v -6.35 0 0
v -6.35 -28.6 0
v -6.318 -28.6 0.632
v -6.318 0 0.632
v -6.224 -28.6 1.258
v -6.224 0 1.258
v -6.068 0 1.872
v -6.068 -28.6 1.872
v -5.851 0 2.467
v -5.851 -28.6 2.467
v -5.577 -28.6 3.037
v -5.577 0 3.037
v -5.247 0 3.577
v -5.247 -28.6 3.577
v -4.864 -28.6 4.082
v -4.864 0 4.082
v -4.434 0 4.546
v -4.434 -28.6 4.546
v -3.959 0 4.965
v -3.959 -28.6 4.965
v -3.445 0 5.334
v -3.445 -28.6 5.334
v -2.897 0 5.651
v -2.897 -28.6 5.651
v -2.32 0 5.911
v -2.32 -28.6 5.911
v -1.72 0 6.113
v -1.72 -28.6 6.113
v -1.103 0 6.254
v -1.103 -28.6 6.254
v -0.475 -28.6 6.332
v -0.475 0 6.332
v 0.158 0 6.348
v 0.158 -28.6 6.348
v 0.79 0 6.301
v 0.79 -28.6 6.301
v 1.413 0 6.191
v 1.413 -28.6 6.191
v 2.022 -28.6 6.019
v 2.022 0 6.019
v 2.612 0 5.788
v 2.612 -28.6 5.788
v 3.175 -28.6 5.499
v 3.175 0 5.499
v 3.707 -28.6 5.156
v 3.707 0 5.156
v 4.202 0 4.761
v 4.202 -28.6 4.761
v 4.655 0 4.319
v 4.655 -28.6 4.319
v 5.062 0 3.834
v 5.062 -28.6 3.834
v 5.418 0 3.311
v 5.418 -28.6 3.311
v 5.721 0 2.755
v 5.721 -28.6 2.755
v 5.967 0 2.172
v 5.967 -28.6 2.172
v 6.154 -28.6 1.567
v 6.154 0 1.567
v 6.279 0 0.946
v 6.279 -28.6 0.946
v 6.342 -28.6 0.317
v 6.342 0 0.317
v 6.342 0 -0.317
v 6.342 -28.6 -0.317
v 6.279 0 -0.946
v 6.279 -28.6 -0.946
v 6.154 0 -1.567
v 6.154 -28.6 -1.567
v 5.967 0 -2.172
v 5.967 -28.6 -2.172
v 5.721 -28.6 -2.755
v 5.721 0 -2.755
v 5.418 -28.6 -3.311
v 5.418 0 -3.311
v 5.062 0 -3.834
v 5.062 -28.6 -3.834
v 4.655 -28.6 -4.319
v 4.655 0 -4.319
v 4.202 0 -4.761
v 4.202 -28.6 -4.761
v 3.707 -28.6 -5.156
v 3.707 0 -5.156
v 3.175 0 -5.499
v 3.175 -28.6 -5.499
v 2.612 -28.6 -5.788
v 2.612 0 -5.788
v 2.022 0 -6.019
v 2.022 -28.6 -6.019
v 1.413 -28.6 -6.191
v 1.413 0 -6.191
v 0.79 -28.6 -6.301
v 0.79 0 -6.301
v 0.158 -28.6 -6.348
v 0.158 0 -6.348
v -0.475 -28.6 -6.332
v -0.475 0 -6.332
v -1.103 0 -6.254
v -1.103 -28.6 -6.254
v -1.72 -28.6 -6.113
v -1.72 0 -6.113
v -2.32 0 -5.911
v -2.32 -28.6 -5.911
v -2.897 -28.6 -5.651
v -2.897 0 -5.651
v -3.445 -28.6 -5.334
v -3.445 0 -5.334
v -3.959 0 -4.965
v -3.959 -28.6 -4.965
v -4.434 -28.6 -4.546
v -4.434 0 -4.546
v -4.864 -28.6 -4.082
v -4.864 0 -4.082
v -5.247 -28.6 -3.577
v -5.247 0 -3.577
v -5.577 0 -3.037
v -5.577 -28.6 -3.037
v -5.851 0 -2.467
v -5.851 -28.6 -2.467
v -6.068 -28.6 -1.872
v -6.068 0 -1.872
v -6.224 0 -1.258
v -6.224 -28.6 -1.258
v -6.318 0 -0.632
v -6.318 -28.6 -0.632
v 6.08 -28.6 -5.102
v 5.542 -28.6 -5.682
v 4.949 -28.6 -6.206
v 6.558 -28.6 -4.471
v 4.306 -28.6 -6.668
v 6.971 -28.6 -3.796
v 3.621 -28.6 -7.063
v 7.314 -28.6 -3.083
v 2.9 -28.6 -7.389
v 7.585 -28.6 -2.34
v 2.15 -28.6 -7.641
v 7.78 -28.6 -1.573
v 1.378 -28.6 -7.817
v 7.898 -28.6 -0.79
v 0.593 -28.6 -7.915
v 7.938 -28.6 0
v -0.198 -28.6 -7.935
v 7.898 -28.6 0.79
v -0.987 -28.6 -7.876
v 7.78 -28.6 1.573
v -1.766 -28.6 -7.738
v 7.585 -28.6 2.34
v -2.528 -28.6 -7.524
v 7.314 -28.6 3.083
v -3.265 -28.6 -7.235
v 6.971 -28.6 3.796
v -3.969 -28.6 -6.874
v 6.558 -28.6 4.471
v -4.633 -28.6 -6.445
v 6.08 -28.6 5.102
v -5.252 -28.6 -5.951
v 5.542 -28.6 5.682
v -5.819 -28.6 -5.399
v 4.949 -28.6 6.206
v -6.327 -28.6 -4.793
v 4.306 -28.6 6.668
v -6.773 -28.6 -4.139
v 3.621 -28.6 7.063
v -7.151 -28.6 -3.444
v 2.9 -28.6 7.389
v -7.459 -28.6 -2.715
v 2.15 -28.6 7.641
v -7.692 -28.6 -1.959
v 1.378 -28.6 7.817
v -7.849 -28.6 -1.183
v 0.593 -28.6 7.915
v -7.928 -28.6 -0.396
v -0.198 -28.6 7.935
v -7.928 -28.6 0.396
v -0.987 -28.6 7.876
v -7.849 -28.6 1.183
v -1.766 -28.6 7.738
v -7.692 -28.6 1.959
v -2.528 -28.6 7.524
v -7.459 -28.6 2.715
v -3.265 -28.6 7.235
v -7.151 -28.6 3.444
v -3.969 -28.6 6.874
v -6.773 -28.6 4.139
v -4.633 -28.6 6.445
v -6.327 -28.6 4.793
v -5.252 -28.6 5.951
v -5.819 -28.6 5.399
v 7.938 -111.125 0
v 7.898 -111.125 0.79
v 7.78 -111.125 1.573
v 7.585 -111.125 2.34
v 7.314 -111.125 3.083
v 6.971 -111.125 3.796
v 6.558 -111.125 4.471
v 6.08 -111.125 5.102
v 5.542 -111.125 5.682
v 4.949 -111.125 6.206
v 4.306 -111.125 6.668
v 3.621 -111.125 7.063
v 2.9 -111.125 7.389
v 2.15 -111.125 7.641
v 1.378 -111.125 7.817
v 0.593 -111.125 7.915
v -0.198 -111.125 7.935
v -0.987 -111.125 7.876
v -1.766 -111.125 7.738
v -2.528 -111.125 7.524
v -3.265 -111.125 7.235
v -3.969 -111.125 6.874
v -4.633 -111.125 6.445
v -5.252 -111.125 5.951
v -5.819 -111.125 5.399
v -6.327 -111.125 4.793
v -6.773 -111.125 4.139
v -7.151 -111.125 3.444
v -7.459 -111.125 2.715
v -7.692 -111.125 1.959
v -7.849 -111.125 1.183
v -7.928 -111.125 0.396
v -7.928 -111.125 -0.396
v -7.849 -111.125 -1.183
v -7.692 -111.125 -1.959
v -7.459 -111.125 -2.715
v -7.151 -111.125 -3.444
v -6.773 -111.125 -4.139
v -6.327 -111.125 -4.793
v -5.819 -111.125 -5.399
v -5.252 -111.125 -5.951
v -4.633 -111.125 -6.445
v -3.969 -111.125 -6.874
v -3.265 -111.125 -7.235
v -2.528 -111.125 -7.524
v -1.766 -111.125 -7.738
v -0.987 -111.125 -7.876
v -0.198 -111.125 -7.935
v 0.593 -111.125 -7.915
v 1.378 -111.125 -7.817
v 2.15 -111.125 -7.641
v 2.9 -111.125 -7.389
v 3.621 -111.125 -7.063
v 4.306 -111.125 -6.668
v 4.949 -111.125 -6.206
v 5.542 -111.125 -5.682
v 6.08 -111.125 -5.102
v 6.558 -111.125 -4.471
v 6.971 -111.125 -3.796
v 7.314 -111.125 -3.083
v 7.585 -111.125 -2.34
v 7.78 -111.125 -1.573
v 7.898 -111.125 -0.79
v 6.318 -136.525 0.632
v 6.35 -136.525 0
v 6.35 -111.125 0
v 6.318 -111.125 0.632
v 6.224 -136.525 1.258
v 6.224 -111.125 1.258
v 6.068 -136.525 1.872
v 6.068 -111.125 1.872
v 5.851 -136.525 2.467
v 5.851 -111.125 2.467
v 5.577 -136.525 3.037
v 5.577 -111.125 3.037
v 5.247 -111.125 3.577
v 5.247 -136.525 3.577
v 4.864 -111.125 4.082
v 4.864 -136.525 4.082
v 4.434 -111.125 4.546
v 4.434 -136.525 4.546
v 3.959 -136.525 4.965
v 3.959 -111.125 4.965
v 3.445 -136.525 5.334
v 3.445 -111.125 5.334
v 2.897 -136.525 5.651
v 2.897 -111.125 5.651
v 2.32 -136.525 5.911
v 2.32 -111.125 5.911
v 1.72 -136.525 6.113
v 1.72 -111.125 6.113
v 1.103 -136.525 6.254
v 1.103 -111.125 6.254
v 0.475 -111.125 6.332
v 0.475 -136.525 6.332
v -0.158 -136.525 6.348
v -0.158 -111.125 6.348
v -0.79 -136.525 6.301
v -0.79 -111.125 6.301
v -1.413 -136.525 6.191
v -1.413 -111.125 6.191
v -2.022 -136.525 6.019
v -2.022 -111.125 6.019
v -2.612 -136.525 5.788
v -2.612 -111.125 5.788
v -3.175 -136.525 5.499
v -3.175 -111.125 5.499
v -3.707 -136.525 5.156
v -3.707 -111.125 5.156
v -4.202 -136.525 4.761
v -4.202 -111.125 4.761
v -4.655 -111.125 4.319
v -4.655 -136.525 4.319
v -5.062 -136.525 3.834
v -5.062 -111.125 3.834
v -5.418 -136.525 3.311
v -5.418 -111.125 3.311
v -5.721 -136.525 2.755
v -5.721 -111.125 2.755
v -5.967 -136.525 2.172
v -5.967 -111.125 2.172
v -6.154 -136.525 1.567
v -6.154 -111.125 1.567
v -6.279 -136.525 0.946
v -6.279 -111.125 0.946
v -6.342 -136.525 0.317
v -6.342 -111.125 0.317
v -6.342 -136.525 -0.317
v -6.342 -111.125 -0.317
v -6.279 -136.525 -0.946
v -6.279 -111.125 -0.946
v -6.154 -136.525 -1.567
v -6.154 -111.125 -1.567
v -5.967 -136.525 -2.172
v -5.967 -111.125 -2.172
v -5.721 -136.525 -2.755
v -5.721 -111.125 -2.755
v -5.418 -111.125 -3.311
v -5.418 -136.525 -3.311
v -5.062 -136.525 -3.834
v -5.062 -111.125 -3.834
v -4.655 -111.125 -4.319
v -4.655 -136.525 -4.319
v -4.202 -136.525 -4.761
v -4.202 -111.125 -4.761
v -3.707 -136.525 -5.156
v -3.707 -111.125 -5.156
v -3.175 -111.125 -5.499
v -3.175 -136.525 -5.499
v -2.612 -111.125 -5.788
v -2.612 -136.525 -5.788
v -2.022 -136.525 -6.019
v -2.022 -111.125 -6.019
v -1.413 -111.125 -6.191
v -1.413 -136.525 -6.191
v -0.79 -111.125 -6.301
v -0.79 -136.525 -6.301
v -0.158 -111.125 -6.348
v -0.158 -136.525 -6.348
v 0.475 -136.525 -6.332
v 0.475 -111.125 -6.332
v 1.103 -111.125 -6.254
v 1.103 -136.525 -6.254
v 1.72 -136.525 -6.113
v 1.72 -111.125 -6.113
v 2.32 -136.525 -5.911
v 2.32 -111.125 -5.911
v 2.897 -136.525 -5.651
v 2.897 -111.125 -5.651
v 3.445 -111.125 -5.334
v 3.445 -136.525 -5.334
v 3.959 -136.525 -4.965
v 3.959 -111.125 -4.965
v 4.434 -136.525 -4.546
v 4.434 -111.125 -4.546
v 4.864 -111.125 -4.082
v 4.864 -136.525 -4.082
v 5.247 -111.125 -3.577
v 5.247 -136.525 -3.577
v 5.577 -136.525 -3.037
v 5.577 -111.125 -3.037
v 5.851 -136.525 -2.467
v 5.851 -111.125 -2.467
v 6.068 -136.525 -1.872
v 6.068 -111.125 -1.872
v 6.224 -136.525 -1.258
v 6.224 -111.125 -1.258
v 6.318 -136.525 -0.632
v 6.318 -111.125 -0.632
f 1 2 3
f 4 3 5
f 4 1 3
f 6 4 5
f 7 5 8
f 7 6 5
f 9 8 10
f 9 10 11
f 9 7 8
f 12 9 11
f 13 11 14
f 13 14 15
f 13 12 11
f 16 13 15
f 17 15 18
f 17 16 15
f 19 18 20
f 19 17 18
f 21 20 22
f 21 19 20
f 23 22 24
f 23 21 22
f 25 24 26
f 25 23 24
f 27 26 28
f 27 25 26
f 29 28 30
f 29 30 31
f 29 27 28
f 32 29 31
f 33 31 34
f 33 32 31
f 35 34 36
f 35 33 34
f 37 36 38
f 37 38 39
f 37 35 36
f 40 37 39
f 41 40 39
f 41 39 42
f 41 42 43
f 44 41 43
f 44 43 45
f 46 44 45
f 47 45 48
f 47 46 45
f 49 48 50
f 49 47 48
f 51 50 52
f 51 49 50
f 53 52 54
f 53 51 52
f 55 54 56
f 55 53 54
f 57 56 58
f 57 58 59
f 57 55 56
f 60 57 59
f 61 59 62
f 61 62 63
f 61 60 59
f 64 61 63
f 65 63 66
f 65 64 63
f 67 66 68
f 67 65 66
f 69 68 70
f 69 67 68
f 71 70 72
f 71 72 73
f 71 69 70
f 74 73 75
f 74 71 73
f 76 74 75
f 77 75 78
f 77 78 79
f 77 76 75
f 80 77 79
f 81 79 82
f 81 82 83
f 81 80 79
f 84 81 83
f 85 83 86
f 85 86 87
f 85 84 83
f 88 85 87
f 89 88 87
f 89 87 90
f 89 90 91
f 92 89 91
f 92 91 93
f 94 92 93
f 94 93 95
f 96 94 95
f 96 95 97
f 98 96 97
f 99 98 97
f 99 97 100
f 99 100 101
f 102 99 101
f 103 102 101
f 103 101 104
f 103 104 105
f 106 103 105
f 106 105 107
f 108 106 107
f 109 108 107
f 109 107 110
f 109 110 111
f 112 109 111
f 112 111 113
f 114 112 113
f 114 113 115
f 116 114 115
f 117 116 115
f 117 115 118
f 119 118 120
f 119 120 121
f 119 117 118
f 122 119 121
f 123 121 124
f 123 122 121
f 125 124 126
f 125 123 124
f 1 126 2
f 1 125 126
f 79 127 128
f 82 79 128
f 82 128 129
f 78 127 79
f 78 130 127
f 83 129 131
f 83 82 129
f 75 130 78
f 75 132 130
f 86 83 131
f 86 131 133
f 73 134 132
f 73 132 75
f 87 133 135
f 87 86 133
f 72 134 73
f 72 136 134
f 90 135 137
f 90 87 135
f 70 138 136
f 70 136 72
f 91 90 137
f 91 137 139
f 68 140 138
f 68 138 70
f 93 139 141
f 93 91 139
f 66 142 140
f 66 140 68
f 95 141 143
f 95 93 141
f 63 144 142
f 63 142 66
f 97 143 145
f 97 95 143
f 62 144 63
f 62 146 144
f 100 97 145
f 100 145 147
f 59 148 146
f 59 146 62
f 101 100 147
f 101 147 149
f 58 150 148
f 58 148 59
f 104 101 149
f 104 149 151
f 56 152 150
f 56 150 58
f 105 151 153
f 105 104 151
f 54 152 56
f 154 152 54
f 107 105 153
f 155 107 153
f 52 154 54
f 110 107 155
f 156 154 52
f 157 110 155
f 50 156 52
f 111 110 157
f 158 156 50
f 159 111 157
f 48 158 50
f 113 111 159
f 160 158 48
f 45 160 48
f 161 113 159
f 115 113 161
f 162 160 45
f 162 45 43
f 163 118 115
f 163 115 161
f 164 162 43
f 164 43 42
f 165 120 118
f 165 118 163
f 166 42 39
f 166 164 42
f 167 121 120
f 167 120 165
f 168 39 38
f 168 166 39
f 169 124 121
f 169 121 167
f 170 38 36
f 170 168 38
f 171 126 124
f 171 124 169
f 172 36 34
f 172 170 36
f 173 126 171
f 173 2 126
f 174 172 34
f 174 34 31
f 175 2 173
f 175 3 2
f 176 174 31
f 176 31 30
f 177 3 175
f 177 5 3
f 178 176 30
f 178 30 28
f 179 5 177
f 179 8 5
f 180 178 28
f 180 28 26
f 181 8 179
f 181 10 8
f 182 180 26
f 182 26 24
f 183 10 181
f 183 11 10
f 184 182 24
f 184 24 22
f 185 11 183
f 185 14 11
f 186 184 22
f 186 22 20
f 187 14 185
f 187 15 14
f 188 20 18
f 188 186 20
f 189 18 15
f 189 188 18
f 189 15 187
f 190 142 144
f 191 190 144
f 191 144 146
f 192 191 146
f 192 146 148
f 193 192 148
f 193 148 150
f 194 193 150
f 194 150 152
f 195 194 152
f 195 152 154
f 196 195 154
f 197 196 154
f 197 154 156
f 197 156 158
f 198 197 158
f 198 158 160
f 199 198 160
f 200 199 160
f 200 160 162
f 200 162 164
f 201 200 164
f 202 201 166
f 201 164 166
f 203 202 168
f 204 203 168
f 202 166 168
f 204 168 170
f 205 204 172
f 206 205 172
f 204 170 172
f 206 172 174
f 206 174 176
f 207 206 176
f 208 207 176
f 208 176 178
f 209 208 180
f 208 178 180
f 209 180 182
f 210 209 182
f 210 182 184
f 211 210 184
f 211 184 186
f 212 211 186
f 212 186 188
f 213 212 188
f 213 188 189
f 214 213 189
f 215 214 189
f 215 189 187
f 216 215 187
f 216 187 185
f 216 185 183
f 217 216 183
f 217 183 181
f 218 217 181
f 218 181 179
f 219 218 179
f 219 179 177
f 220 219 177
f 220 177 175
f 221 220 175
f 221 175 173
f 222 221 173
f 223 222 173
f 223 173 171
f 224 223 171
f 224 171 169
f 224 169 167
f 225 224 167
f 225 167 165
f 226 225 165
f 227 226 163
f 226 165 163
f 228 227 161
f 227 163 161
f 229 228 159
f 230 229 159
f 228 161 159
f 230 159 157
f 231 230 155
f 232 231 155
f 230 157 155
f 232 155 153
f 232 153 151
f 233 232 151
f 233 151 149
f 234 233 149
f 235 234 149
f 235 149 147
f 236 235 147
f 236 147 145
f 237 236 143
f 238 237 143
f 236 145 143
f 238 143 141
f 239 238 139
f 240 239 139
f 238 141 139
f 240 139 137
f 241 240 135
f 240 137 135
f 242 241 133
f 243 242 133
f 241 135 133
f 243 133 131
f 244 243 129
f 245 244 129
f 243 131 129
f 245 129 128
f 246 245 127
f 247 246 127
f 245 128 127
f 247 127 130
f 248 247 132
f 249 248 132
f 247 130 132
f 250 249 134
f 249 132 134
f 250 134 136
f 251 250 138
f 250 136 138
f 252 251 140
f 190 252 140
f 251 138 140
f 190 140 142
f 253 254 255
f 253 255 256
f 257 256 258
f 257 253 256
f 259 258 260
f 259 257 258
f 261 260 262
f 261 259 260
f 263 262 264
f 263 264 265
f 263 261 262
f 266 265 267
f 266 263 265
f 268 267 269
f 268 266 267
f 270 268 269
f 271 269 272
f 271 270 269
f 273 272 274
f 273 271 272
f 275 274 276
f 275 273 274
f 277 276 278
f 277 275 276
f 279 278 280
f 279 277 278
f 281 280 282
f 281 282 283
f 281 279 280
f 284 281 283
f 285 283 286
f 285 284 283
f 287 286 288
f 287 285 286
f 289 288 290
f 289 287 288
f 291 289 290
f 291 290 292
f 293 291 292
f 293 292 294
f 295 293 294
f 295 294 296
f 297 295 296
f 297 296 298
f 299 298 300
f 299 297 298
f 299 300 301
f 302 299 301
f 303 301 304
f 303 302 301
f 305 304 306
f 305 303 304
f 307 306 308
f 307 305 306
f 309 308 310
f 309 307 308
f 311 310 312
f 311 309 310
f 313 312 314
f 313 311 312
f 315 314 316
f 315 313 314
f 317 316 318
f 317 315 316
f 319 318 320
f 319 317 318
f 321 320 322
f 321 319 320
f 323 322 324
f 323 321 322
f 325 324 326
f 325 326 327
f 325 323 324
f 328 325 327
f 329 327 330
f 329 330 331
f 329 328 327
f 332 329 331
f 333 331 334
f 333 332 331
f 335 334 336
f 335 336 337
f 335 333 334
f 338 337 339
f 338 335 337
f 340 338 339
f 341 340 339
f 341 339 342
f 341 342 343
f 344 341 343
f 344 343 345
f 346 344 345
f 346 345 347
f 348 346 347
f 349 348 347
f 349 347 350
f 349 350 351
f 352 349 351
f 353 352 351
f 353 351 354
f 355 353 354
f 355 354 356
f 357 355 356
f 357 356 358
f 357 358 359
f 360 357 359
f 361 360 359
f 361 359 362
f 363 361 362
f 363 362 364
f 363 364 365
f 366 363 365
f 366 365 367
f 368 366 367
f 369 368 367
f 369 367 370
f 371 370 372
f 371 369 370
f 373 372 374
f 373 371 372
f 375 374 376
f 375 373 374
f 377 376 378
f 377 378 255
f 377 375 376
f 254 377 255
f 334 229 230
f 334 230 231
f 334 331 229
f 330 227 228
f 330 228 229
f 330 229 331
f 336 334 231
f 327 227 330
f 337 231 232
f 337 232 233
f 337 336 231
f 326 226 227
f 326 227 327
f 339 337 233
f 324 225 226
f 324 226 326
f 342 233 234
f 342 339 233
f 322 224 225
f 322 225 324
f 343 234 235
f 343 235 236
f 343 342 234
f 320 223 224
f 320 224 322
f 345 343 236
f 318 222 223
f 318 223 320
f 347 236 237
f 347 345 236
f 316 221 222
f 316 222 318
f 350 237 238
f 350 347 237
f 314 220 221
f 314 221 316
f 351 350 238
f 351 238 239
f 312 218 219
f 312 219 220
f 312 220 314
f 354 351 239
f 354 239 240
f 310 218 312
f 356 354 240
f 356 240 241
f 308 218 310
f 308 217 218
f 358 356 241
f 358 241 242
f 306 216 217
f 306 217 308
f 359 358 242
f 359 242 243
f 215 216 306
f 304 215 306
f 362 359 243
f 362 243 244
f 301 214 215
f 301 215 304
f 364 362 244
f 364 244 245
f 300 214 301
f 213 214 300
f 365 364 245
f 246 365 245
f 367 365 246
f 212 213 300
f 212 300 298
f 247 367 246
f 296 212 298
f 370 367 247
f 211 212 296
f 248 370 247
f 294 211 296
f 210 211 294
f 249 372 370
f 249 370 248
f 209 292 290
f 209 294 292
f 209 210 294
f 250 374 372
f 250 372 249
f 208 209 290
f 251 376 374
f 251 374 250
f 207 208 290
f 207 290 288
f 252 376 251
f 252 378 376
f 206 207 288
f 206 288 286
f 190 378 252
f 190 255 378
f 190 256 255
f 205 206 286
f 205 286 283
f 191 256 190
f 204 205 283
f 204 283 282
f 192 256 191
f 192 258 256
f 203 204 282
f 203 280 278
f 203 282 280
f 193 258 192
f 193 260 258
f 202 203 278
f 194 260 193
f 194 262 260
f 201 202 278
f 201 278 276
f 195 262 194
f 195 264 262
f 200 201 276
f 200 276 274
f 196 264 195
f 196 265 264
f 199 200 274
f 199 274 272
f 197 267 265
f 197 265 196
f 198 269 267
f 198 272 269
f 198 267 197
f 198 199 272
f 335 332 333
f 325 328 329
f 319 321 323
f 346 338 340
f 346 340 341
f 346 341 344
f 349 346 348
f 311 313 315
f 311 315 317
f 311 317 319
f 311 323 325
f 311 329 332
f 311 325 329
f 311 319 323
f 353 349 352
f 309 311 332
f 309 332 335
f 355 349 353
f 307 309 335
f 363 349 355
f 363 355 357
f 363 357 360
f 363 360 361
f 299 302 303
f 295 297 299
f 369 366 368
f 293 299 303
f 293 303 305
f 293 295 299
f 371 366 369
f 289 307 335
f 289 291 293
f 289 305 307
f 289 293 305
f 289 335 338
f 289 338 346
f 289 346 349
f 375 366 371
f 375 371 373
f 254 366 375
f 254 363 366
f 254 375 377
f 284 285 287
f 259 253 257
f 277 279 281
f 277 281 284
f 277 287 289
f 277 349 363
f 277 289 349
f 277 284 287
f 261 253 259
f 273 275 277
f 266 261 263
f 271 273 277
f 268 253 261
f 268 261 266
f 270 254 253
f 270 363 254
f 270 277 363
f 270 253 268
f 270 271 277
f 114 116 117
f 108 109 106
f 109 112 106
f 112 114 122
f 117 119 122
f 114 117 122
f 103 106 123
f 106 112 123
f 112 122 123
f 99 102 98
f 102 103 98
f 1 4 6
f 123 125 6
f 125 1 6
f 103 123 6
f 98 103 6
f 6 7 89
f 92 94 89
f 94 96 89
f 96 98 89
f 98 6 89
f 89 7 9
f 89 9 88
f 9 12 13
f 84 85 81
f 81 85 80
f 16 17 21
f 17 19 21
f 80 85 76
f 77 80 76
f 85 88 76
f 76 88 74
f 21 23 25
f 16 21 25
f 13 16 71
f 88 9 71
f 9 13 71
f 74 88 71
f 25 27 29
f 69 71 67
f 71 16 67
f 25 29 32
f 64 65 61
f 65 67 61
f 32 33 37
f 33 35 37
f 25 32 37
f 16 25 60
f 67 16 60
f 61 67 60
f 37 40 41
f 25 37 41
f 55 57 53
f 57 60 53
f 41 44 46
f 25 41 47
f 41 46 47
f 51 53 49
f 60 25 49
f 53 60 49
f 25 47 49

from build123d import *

# Parameters (mm, degrees)
F0_R     = 7.9375
F1_DEPTH = 136.525
F2_R     = 7.9375
F2_R_2   = 6.35
F3_DEPTH = 25.4
F4_R     = 7.9375
F4_R_2   = 6.35
F5_DEPTH = 28.6004


with BuildPart() as f1:
    # F0 (on Front) → F1 (new body)
    with BuildSketch(Plane.XZ):
        Circle(F0_R)
    extrude(amount=F1_DEPTH)

    # F2 (on face) → F3 (cut)
    with BuildSketch(Plane.XZ.offset(136.525)):
        Circle(F2_R)
        Circle(F2_R_2, mode=Mode.SUBTRACT)
    extrude(amount=-F3_DEPTH, mode=Mode.SUBTRACT)

    # F4 (on face) → F5 (cut)
    with BuildSketch(Plane(origin=(0, 0, 0), x_dir=(-1, 0, 0), z_dir=(0, 1, 0))):
        Circle(F4_R)
        Circle(F4_R_2, mode=Mode.SUBTRACT)
    extrude(amount=-F5_DEPTH, mode=Mode.SUBTRACT)


solid = f1.part
